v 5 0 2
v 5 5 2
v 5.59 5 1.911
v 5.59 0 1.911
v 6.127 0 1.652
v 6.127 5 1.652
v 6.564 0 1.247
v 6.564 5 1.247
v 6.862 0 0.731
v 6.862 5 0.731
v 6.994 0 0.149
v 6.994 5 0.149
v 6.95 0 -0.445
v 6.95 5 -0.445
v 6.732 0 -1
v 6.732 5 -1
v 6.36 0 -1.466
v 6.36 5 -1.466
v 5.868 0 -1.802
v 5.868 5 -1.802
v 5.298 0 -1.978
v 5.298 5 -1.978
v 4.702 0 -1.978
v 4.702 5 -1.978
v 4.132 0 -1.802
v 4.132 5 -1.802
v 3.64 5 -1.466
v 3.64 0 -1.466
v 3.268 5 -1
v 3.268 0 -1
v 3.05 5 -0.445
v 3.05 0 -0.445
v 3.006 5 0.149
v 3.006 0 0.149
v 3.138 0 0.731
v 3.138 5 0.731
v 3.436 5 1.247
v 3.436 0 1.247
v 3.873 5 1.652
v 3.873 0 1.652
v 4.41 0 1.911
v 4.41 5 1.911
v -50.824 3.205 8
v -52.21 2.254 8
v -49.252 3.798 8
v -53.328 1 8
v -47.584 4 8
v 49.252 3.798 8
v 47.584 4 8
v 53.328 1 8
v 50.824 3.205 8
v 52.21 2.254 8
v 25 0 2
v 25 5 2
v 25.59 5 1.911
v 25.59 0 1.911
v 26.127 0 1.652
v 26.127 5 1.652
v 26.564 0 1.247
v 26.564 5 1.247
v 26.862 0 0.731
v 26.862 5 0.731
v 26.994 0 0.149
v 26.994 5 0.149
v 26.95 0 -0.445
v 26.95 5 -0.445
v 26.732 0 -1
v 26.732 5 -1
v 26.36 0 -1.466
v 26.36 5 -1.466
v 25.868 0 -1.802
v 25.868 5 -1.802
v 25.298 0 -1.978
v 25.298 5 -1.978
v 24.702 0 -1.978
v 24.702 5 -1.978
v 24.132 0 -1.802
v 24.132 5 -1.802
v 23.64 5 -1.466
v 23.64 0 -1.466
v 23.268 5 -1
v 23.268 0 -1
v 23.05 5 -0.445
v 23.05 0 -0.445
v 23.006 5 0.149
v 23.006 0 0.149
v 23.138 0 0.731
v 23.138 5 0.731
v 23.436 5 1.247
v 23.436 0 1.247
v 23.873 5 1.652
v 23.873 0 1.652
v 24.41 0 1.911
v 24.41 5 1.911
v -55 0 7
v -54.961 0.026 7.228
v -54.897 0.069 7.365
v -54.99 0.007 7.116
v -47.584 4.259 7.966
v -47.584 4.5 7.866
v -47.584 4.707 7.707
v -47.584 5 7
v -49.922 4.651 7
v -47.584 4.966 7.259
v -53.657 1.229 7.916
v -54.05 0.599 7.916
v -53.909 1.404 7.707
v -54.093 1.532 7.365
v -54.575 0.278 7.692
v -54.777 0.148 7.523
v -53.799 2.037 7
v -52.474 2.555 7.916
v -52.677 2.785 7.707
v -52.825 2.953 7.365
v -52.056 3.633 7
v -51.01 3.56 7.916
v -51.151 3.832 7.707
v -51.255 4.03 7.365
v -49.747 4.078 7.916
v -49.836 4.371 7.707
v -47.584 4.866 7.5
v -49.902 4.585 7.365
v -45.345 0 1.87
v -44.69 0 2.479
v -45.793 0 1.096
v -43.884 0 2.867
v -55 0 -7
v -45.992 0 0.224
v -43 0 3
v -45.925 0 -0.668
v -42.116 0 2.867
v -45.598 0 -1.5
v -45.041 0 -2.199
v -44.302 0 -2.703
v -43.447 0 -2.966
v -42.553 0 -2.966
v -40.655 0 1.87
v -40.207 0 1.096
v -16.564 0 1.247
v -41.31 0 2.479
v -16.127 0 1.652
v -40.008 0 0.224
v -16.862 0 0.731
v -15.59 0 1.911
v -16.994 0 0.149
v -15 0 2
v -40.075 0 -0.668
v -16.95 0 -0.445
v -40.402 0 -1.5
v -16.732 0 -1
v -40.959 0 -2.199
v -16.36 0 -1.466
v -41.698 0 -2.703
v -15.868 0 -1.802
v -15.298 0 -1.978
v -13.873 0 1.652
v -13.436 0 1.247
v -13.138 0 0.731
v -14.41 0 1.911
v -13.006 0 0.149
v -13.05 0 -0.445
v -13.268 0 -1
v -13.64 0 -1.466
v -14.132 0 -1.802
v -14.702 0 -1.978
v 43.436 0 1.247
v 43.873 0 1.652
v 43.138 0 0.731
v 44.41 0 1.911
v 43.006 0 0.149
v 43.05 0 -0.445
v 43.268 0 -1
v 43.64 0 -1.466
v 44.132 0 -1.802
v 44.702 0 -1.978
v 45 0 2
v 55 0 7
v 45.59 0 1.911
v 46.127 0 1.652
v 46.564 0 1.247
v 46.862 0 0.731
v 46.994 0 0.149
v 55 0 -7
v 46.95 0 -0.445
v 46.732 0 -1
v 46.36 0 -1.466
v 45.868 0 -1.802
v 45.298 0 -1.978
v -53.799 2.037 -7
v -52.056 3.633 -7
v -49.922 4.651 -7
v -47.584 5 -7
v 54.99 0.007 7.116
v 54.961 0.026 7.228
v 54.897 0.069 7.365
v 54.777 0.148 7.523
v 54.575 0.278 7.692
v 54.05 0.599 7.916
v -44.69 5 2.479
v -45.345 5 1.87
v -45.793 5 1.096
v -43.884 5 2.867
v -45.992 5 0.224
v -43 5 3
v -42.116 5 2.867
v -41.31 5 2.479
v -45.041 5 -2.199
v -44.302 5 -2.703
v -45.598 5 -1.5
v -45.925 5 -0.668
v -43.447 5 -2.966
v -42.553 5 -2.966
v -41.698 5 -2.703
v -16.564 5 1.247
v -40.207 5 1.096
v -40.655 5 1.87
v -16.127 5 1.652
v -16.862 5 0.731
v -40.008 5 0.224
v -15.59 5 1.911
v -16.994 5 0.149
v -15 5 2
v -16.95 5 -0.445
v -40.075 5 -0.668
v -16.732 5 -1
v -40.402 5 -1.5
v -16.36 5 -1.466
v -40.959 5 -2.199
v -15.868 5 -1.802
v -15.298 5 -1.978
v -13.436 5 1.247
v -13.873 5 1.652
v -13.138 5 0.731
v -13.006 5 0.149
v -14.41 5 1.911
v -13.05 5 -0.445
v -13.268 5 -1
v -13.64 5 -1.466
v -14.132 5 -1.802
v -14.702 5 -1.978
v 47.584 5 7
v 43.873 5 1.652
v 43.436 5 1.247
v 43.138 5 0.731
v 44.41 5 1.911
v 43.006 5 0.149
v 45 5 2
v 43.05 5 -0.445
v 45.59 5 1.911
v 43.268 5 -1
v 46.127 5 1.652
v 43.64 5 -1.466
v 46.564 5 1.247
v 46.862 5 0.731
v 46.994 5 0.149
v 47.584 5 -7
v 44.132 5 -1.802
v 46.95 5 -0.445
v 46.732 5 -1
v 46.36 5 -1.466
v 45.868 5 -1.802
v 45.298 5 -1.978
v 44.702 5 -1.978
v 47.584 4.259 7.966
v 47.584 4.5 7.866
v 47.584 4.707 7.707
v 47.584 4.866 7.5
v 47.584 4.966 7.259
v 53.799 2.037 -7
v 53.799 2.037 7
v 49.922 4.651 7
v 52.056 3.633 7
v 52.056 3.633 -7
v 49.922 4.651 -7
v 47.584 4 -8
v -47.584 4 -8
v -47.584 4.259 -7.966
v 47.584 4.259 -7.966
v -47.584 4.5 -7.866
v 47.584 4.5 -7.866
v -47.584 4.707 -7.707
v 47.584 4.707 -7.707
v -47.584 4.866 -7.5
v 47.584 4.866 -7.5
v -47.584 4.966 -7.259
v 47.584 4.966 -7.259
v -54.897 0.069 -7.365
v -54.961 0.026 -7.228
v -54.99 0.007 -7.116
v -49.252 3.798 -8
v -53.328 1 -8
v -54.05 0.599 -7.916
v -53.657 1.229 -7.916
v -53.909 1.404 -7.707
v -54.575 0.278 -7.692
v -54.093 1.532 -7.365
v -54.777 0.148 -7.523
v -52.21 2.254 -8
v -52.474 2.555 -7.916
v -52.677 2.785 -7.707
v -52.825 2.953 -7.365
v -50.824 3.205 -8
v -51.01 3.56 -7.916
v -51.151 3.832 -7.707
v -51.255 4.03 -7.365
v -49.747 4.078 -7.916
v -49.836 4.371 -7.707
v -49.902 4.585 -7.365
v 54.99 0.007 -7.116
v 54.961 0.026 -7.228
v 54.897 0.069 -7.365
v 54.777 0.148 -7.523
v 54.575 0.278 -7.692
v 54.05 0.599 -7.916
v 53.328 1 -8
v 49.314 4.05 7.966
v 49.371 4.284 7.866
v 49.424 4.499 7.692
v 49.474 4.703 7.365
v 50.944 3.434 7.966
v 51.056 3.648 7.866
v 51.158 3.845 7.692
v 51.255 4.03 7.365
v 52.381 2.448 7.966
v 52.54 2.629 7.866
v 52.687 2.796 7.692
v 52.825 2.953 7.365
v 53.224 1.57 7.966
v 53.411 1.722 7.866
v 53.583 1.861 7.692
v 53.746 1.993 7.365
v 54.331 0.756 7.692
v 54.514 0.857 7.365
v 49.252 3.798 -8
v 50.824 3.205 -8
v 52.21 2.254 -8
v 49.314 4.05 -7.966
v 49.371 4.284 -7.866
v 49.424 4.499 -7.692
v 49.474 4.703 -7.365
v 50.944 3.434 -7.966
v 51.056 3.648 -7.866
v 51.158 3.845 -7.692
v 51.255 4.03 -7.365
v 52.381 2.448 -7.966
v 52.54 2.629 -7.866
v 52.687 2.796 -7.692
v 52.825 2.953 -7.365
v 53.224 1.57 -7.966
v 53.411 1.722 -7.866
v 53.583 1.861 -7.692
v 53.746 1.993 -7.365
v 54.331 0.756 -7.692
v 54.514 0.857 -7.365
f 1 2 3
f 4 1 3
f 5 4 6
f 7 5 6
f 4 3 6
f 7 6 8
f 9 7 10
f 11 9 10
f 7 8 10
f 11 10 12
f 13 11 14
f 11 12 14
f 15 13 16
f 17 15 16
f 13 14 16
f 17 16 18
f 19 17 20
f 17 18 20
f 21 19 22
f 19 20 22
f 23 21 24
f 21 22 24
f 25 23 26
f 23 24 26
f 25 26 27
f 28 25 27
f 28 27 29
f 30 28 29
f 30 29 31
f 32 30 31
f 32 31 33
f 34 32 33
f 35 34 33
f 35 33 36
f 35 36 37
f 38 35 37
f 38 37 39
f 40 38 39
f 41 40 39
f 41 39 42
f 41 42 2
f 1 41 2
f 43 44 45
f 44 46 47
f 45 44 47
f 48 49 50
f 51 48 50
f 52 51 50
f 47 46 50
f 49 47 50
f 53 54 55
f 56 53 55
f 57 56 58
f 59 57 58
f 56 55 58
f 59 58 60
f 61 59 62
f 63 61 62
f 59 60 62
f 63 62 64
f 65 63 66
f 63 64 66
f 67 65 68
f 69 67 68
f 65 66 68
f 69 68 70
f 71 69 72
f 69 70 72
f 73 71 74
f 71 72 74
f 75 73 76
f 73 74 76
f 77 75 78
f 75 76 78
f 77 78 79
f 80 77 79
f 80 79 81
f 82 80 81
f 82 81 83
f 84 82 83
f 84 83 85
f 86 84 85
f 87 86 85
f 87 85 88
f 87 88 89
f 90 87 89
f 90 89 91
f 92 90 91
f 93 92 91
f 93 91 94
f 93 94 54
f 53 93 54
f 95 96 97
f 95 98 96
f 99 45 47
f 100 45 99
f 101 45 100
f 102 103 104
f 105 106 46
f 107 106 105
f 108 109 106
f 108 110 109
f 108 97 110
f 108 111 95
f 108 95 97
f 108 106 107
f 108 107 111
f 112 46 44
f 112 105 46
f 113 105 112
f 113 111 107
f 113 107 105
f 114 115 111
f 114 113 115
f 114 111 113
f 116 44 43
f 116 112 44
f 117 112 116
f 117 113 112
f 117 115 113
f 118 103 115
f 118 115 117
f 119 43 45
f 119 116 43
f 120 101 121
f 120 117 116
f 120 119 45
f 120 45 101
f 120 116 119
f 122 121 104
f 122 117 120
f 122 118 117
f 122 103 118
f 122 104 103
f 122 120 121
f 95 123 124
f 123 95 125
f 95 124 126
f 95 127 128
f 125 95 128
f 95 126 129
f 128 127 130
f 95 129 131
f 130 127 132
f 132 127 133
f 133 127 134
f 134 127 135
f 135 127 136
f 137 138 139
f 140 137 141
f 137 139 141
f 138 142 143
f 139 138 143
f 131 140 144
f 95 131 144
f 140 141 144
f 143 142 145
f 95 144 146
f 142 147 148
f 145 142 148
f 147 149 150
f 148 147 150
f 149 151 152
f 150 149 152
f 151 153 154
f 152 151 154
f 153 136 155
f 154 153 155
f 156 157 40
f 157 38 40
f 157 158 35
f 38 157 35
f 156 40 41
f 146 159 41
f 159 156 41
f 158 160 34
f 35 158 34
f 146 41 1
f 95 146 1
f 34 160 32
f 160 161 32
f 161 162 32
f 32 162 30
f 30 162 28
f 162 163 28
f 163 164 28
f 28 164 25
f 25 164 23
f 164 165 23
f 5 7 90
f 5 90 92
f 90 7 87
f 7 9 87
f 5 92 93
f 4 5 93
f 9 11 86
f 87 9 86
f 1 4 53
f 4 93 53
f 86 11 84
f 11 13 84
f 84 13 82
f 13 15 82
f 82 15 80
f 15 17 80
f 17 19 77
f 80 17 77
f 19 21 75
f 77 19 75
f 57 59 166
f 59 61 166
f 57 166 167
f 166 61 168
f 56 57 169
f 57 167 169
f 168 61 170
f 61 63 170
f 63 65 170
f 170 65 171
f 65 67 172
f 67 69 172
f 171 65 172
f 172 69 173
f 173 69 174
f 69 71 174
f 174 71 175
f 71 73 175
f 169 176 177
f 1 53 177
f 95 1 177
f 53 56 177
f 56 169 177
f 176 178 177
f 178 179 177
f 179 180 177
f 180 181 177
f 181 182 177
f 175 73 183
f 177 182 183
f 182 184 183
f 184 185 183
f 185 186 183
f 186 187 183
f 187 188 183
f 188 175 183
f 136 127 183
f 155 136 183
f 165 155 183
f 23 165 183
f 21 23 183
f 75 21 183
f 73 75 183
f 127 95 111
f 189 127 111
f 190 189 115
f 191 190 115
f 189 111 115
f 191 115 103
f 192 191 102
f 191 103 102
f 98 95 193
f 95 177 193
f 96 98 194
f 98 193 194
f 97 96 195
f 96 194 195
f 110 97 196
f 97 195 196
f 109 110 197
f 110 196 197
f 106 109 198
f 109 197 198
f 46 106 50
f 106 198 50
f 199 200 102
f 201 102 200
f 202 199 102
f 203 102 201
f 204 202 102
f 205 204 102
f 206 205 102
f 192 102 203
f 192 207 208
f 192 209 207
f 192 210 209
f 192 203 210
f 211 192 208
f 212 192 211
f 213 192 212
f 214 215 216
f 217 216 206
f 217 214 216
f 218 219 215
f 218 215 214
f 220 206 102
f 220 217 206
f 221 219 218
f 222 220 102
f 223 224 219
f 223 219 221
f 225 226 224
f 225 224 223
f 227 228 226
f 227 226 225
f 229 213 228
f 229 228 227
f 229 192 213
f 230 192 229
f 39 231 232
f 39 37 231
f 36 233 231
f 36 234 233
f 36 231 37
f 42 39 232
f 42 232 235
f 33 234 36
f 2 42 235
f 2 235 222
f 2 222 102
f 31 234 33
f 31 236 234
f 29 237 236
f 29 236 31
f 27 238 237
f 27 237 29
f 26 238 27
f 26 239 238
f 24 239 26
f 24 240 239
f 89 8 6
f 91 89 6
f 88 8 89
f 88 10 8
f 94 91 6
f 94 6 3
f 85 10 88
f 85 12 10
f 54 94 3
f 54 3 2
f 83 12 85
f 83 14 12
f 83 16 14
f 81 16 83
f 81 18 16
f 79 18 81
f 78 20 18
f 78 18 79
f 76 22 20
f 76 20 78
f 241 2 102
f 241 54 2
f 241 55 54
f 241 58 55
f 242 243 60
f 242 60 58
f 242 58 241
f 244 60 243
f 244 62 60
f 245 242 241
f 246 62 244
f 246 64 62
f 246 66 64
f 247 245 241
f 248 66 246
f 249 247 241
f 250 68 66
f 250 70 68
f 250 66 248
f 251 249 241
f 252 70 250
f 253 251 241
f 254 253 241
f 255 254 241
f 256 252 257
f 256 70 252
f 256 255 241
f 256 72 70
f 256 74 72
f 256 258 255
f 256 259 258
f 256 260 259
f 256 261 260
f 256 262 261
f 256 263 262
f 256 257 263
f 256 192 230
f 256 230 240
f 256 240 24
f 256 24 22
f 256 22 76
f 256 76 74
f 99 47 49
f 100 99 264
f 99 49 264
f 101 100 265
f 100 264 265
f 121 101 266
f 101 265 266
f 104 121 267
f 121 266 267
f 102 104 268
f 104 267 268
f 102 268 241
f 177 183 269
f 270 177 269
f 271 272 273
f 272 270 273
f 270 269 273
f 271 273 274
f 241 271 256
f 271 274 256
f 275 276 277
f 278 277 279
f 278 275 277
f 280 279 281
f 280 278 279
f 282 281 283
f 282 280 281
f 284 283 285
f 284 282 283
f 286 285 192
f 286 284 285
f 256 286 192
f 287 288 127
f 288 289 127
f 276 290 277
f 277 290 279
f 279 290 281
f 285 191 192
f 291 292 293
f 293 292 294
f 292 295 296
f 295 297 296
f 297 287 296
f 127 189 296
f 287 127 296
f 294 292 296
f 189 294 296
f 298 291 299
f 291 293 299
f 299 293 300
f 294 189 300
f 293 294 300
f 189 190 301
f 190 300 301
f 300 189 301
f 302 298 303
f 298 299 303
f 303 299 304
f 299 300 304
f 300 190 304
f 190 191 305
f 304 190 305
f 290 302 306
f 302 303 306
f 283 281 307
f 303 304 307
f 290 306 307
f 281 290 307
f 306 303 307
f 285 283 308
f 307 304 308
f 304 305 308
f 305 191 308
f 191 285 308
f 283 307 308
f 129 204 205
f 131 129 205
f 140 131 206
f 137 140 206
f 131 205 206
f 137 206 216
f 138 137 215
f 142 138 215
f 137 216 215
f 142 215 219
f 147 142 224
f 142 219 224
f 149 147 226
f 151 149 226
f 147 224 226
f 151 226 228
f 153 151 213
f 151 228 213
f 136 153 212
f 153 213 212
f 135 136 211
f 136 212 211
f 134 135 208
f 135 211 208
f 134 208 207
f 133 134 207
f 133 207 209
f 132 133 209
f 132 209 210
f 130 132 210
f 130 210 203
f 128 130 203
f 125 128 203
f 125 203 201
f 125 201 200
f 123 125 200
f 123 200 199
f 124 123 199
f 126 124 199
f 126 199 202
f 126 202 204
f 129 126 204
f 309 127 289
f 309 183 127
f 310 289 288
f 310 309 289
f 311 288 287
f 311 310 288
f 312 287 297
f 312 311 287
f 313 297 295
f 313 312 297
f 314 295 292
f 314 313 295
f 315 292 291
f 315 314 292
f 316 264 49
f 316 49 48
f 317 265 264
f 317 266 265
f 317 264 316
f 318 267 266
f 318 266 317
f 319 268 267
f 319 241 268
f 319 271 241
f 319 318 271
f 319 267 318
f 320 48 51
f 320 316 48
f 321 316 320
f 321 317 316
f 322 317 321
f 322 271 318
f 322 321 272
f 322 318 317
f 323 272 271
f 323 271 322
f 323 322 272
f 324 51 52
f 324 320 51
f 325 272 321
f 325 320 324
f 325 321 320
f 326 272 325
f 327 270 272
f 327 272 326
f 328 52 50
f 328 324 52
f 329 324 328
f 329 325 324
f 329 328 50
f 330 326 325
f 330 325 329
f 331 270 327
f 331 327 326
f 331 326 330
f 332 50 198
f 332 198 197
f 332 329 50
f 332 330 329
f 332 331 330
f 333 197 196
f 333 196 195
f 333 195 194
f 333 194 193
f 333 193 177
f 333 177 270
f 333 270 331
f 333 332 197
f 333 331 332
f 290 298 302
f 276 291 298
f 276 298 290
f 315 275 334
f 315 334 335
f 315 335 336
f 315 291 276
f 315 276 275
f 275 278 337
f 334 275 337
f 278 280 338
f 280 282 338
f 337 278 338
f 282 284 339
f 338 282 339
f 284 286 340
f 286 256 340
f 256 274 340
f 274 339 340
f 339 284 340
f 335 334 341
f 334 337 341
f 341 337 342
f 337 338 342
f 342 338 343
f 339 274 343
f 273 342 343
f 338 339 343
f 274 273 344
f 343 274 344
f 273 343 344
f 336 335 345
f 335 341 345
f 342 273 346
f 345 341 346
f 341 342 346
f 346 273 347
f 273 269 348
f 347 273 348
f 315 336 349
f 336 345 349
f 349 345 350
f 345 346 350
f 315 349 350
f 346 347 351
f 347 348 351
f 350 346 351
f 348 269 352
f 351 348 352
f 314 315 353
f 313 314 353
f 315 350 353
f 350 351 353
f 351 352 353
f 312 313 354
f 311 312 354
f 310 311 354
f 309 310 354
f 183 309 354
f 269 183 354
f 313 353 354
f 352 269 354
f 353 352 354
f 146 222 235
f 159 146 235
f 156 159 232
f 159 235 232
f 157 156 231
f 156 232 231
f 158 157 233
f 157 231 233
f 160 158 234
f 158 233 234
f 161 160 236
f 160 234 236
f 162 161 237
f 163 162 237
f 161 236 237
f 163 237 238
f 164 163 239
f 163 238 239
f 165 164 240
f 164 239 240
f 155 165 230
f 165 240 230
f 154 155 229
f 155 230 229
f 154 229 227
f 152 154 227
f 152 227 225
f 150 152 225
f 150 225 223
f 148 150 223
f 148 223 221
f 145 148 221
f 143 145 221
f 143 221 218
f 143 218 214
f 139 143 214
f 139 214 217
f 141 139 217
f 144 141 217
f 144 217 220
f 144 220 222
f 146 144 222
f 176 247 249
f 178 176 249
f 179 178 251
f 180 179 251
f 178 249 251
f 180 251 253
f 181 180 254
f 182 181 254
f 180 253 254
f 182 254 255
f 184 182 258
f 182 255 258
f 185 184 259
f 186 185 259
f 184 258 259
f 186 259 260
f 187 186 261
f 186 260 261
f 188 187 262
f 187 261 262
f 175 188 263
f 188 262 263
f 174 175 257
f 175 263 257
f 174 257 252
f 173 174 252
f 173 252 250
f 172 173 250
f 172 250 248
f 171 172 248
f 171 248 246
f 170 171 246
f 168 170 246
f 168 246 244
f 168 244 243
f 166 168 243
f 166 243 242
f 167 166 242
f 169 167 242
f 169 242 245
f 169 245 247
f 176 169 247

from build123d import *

# Parameters (mm, degrees)
SKETCH2_W           = 110
SKETCH2_H           = 16
BOSS_EXTRUDE1_DEPTH = 5
SKETCH3_R           = 3
CUT_EXTRUDE1_DEPTH  = 56.803225713
SKETCH5_R           = 2
CUT_EXTRUDE2_DEPTH  = 56.803225713
FILLET1_R           = 8
FILLET2_R           = 1


with BuildPart() as part:
    # Sketch2 → Boss-Extrude1 (new body)
    with BuildSketch(Plane(origin=(0, 0, 0), x_dir=(1, 0, 0), z_dir=(0, 1, 0))):
        Rectangle(SKETCH2_W, SKETCH2_H)
    extrude(amount=BOSS_EXTRUDE1_DEPTH)

    # Sketch3 → Cut-Extrude1 (cut, through all)
    with BuildSketch(Plane(origin=(0, 5, 0), x_dir=(1, 0, 0), z_dir=(0, 1, 0))):
        with Locations(Location((-43, 0, 0), (0, 0, 270))):
            Circle(SKETCH3_R)
    extrude(amount=-CUT_EXTRUDE1_DEPTH, mode=Mode.SUBTRACT)

    # Sketch5 → Cut-Extrude2 (cut, through all)
    with BuildSketch(Plane(origin=(0, 5, 0), x_dir=(1, 0, 0), z_dir=(0, 1, 0))):
        with Locations(Location((-15, 0, 0), (0, 0, 270))):
            Circle(SKETCH5_R)
        with Locations(Location((5, 0, 0), (0, 0, 270))):
            Circle(SKETCH5_R)
        with Locations(Location((25, 0, 0), (0, 0, 270))):
            Circle(SKETCH5_R)
        with Locations(Location((45, 0, 0), (0, 0, 270))):
            Circle(SKETCH5_R)
    extrude(amount=-CUT_EXTRUDE2_DEPTH, mode=Mode.SUBTRACT)

    # Fillet1
    # the kernel refuses this fillet: 8 mm, written as the material it takes off along each edge
    with BuildSketch(Plane(origin=(55, 5, -26.540496218), x_dir=(0, -1, 0), z_dir=(0, 0, 1)), Plane(origin=(-55, 5, 26.540496218), x_dir=(0, -1, 0), z_dir=(0, 0, -1))) as fillet1_piece_1:
        with BuildLine():
            CenterArc((8, -7.416198487), FILLET1_R, 112.024312837, 67.975687163)
            Line((0, -7.416198487), (-0.16, -7.416198487))
            Line((-0.16, -7.416198487), (-0.16, 0))
            Line((-0.16, 0), (0, 0.16))
            ThreePointArc((0, 0.16), (2.5, 0.16), (4.94, 0.14832397))
            Line((4.94, 0.14832397), (5, 0))
        make_face()
    extrude(amount=53.080992435, mode=Mode.SUBTRACT)

    # Fillet2
    fillet2_edges = [part.edges().sort_by_distance(p)[0] for p in [
        (0, 5, -8),
        (0, 5, 8),
        (-52.055937468, 3.633249581, -8),
        (52.055937468, 3.633249581, -8),
        (-52.055937468, 3.633249581, 8),
        (52.055937468, 3.633249581, 8),
        (0, 0, 8),
        (0, 0, -8),
    ]]
    fillet(fillet2_edges, radius=FILLET2_R)


solid = part.part
